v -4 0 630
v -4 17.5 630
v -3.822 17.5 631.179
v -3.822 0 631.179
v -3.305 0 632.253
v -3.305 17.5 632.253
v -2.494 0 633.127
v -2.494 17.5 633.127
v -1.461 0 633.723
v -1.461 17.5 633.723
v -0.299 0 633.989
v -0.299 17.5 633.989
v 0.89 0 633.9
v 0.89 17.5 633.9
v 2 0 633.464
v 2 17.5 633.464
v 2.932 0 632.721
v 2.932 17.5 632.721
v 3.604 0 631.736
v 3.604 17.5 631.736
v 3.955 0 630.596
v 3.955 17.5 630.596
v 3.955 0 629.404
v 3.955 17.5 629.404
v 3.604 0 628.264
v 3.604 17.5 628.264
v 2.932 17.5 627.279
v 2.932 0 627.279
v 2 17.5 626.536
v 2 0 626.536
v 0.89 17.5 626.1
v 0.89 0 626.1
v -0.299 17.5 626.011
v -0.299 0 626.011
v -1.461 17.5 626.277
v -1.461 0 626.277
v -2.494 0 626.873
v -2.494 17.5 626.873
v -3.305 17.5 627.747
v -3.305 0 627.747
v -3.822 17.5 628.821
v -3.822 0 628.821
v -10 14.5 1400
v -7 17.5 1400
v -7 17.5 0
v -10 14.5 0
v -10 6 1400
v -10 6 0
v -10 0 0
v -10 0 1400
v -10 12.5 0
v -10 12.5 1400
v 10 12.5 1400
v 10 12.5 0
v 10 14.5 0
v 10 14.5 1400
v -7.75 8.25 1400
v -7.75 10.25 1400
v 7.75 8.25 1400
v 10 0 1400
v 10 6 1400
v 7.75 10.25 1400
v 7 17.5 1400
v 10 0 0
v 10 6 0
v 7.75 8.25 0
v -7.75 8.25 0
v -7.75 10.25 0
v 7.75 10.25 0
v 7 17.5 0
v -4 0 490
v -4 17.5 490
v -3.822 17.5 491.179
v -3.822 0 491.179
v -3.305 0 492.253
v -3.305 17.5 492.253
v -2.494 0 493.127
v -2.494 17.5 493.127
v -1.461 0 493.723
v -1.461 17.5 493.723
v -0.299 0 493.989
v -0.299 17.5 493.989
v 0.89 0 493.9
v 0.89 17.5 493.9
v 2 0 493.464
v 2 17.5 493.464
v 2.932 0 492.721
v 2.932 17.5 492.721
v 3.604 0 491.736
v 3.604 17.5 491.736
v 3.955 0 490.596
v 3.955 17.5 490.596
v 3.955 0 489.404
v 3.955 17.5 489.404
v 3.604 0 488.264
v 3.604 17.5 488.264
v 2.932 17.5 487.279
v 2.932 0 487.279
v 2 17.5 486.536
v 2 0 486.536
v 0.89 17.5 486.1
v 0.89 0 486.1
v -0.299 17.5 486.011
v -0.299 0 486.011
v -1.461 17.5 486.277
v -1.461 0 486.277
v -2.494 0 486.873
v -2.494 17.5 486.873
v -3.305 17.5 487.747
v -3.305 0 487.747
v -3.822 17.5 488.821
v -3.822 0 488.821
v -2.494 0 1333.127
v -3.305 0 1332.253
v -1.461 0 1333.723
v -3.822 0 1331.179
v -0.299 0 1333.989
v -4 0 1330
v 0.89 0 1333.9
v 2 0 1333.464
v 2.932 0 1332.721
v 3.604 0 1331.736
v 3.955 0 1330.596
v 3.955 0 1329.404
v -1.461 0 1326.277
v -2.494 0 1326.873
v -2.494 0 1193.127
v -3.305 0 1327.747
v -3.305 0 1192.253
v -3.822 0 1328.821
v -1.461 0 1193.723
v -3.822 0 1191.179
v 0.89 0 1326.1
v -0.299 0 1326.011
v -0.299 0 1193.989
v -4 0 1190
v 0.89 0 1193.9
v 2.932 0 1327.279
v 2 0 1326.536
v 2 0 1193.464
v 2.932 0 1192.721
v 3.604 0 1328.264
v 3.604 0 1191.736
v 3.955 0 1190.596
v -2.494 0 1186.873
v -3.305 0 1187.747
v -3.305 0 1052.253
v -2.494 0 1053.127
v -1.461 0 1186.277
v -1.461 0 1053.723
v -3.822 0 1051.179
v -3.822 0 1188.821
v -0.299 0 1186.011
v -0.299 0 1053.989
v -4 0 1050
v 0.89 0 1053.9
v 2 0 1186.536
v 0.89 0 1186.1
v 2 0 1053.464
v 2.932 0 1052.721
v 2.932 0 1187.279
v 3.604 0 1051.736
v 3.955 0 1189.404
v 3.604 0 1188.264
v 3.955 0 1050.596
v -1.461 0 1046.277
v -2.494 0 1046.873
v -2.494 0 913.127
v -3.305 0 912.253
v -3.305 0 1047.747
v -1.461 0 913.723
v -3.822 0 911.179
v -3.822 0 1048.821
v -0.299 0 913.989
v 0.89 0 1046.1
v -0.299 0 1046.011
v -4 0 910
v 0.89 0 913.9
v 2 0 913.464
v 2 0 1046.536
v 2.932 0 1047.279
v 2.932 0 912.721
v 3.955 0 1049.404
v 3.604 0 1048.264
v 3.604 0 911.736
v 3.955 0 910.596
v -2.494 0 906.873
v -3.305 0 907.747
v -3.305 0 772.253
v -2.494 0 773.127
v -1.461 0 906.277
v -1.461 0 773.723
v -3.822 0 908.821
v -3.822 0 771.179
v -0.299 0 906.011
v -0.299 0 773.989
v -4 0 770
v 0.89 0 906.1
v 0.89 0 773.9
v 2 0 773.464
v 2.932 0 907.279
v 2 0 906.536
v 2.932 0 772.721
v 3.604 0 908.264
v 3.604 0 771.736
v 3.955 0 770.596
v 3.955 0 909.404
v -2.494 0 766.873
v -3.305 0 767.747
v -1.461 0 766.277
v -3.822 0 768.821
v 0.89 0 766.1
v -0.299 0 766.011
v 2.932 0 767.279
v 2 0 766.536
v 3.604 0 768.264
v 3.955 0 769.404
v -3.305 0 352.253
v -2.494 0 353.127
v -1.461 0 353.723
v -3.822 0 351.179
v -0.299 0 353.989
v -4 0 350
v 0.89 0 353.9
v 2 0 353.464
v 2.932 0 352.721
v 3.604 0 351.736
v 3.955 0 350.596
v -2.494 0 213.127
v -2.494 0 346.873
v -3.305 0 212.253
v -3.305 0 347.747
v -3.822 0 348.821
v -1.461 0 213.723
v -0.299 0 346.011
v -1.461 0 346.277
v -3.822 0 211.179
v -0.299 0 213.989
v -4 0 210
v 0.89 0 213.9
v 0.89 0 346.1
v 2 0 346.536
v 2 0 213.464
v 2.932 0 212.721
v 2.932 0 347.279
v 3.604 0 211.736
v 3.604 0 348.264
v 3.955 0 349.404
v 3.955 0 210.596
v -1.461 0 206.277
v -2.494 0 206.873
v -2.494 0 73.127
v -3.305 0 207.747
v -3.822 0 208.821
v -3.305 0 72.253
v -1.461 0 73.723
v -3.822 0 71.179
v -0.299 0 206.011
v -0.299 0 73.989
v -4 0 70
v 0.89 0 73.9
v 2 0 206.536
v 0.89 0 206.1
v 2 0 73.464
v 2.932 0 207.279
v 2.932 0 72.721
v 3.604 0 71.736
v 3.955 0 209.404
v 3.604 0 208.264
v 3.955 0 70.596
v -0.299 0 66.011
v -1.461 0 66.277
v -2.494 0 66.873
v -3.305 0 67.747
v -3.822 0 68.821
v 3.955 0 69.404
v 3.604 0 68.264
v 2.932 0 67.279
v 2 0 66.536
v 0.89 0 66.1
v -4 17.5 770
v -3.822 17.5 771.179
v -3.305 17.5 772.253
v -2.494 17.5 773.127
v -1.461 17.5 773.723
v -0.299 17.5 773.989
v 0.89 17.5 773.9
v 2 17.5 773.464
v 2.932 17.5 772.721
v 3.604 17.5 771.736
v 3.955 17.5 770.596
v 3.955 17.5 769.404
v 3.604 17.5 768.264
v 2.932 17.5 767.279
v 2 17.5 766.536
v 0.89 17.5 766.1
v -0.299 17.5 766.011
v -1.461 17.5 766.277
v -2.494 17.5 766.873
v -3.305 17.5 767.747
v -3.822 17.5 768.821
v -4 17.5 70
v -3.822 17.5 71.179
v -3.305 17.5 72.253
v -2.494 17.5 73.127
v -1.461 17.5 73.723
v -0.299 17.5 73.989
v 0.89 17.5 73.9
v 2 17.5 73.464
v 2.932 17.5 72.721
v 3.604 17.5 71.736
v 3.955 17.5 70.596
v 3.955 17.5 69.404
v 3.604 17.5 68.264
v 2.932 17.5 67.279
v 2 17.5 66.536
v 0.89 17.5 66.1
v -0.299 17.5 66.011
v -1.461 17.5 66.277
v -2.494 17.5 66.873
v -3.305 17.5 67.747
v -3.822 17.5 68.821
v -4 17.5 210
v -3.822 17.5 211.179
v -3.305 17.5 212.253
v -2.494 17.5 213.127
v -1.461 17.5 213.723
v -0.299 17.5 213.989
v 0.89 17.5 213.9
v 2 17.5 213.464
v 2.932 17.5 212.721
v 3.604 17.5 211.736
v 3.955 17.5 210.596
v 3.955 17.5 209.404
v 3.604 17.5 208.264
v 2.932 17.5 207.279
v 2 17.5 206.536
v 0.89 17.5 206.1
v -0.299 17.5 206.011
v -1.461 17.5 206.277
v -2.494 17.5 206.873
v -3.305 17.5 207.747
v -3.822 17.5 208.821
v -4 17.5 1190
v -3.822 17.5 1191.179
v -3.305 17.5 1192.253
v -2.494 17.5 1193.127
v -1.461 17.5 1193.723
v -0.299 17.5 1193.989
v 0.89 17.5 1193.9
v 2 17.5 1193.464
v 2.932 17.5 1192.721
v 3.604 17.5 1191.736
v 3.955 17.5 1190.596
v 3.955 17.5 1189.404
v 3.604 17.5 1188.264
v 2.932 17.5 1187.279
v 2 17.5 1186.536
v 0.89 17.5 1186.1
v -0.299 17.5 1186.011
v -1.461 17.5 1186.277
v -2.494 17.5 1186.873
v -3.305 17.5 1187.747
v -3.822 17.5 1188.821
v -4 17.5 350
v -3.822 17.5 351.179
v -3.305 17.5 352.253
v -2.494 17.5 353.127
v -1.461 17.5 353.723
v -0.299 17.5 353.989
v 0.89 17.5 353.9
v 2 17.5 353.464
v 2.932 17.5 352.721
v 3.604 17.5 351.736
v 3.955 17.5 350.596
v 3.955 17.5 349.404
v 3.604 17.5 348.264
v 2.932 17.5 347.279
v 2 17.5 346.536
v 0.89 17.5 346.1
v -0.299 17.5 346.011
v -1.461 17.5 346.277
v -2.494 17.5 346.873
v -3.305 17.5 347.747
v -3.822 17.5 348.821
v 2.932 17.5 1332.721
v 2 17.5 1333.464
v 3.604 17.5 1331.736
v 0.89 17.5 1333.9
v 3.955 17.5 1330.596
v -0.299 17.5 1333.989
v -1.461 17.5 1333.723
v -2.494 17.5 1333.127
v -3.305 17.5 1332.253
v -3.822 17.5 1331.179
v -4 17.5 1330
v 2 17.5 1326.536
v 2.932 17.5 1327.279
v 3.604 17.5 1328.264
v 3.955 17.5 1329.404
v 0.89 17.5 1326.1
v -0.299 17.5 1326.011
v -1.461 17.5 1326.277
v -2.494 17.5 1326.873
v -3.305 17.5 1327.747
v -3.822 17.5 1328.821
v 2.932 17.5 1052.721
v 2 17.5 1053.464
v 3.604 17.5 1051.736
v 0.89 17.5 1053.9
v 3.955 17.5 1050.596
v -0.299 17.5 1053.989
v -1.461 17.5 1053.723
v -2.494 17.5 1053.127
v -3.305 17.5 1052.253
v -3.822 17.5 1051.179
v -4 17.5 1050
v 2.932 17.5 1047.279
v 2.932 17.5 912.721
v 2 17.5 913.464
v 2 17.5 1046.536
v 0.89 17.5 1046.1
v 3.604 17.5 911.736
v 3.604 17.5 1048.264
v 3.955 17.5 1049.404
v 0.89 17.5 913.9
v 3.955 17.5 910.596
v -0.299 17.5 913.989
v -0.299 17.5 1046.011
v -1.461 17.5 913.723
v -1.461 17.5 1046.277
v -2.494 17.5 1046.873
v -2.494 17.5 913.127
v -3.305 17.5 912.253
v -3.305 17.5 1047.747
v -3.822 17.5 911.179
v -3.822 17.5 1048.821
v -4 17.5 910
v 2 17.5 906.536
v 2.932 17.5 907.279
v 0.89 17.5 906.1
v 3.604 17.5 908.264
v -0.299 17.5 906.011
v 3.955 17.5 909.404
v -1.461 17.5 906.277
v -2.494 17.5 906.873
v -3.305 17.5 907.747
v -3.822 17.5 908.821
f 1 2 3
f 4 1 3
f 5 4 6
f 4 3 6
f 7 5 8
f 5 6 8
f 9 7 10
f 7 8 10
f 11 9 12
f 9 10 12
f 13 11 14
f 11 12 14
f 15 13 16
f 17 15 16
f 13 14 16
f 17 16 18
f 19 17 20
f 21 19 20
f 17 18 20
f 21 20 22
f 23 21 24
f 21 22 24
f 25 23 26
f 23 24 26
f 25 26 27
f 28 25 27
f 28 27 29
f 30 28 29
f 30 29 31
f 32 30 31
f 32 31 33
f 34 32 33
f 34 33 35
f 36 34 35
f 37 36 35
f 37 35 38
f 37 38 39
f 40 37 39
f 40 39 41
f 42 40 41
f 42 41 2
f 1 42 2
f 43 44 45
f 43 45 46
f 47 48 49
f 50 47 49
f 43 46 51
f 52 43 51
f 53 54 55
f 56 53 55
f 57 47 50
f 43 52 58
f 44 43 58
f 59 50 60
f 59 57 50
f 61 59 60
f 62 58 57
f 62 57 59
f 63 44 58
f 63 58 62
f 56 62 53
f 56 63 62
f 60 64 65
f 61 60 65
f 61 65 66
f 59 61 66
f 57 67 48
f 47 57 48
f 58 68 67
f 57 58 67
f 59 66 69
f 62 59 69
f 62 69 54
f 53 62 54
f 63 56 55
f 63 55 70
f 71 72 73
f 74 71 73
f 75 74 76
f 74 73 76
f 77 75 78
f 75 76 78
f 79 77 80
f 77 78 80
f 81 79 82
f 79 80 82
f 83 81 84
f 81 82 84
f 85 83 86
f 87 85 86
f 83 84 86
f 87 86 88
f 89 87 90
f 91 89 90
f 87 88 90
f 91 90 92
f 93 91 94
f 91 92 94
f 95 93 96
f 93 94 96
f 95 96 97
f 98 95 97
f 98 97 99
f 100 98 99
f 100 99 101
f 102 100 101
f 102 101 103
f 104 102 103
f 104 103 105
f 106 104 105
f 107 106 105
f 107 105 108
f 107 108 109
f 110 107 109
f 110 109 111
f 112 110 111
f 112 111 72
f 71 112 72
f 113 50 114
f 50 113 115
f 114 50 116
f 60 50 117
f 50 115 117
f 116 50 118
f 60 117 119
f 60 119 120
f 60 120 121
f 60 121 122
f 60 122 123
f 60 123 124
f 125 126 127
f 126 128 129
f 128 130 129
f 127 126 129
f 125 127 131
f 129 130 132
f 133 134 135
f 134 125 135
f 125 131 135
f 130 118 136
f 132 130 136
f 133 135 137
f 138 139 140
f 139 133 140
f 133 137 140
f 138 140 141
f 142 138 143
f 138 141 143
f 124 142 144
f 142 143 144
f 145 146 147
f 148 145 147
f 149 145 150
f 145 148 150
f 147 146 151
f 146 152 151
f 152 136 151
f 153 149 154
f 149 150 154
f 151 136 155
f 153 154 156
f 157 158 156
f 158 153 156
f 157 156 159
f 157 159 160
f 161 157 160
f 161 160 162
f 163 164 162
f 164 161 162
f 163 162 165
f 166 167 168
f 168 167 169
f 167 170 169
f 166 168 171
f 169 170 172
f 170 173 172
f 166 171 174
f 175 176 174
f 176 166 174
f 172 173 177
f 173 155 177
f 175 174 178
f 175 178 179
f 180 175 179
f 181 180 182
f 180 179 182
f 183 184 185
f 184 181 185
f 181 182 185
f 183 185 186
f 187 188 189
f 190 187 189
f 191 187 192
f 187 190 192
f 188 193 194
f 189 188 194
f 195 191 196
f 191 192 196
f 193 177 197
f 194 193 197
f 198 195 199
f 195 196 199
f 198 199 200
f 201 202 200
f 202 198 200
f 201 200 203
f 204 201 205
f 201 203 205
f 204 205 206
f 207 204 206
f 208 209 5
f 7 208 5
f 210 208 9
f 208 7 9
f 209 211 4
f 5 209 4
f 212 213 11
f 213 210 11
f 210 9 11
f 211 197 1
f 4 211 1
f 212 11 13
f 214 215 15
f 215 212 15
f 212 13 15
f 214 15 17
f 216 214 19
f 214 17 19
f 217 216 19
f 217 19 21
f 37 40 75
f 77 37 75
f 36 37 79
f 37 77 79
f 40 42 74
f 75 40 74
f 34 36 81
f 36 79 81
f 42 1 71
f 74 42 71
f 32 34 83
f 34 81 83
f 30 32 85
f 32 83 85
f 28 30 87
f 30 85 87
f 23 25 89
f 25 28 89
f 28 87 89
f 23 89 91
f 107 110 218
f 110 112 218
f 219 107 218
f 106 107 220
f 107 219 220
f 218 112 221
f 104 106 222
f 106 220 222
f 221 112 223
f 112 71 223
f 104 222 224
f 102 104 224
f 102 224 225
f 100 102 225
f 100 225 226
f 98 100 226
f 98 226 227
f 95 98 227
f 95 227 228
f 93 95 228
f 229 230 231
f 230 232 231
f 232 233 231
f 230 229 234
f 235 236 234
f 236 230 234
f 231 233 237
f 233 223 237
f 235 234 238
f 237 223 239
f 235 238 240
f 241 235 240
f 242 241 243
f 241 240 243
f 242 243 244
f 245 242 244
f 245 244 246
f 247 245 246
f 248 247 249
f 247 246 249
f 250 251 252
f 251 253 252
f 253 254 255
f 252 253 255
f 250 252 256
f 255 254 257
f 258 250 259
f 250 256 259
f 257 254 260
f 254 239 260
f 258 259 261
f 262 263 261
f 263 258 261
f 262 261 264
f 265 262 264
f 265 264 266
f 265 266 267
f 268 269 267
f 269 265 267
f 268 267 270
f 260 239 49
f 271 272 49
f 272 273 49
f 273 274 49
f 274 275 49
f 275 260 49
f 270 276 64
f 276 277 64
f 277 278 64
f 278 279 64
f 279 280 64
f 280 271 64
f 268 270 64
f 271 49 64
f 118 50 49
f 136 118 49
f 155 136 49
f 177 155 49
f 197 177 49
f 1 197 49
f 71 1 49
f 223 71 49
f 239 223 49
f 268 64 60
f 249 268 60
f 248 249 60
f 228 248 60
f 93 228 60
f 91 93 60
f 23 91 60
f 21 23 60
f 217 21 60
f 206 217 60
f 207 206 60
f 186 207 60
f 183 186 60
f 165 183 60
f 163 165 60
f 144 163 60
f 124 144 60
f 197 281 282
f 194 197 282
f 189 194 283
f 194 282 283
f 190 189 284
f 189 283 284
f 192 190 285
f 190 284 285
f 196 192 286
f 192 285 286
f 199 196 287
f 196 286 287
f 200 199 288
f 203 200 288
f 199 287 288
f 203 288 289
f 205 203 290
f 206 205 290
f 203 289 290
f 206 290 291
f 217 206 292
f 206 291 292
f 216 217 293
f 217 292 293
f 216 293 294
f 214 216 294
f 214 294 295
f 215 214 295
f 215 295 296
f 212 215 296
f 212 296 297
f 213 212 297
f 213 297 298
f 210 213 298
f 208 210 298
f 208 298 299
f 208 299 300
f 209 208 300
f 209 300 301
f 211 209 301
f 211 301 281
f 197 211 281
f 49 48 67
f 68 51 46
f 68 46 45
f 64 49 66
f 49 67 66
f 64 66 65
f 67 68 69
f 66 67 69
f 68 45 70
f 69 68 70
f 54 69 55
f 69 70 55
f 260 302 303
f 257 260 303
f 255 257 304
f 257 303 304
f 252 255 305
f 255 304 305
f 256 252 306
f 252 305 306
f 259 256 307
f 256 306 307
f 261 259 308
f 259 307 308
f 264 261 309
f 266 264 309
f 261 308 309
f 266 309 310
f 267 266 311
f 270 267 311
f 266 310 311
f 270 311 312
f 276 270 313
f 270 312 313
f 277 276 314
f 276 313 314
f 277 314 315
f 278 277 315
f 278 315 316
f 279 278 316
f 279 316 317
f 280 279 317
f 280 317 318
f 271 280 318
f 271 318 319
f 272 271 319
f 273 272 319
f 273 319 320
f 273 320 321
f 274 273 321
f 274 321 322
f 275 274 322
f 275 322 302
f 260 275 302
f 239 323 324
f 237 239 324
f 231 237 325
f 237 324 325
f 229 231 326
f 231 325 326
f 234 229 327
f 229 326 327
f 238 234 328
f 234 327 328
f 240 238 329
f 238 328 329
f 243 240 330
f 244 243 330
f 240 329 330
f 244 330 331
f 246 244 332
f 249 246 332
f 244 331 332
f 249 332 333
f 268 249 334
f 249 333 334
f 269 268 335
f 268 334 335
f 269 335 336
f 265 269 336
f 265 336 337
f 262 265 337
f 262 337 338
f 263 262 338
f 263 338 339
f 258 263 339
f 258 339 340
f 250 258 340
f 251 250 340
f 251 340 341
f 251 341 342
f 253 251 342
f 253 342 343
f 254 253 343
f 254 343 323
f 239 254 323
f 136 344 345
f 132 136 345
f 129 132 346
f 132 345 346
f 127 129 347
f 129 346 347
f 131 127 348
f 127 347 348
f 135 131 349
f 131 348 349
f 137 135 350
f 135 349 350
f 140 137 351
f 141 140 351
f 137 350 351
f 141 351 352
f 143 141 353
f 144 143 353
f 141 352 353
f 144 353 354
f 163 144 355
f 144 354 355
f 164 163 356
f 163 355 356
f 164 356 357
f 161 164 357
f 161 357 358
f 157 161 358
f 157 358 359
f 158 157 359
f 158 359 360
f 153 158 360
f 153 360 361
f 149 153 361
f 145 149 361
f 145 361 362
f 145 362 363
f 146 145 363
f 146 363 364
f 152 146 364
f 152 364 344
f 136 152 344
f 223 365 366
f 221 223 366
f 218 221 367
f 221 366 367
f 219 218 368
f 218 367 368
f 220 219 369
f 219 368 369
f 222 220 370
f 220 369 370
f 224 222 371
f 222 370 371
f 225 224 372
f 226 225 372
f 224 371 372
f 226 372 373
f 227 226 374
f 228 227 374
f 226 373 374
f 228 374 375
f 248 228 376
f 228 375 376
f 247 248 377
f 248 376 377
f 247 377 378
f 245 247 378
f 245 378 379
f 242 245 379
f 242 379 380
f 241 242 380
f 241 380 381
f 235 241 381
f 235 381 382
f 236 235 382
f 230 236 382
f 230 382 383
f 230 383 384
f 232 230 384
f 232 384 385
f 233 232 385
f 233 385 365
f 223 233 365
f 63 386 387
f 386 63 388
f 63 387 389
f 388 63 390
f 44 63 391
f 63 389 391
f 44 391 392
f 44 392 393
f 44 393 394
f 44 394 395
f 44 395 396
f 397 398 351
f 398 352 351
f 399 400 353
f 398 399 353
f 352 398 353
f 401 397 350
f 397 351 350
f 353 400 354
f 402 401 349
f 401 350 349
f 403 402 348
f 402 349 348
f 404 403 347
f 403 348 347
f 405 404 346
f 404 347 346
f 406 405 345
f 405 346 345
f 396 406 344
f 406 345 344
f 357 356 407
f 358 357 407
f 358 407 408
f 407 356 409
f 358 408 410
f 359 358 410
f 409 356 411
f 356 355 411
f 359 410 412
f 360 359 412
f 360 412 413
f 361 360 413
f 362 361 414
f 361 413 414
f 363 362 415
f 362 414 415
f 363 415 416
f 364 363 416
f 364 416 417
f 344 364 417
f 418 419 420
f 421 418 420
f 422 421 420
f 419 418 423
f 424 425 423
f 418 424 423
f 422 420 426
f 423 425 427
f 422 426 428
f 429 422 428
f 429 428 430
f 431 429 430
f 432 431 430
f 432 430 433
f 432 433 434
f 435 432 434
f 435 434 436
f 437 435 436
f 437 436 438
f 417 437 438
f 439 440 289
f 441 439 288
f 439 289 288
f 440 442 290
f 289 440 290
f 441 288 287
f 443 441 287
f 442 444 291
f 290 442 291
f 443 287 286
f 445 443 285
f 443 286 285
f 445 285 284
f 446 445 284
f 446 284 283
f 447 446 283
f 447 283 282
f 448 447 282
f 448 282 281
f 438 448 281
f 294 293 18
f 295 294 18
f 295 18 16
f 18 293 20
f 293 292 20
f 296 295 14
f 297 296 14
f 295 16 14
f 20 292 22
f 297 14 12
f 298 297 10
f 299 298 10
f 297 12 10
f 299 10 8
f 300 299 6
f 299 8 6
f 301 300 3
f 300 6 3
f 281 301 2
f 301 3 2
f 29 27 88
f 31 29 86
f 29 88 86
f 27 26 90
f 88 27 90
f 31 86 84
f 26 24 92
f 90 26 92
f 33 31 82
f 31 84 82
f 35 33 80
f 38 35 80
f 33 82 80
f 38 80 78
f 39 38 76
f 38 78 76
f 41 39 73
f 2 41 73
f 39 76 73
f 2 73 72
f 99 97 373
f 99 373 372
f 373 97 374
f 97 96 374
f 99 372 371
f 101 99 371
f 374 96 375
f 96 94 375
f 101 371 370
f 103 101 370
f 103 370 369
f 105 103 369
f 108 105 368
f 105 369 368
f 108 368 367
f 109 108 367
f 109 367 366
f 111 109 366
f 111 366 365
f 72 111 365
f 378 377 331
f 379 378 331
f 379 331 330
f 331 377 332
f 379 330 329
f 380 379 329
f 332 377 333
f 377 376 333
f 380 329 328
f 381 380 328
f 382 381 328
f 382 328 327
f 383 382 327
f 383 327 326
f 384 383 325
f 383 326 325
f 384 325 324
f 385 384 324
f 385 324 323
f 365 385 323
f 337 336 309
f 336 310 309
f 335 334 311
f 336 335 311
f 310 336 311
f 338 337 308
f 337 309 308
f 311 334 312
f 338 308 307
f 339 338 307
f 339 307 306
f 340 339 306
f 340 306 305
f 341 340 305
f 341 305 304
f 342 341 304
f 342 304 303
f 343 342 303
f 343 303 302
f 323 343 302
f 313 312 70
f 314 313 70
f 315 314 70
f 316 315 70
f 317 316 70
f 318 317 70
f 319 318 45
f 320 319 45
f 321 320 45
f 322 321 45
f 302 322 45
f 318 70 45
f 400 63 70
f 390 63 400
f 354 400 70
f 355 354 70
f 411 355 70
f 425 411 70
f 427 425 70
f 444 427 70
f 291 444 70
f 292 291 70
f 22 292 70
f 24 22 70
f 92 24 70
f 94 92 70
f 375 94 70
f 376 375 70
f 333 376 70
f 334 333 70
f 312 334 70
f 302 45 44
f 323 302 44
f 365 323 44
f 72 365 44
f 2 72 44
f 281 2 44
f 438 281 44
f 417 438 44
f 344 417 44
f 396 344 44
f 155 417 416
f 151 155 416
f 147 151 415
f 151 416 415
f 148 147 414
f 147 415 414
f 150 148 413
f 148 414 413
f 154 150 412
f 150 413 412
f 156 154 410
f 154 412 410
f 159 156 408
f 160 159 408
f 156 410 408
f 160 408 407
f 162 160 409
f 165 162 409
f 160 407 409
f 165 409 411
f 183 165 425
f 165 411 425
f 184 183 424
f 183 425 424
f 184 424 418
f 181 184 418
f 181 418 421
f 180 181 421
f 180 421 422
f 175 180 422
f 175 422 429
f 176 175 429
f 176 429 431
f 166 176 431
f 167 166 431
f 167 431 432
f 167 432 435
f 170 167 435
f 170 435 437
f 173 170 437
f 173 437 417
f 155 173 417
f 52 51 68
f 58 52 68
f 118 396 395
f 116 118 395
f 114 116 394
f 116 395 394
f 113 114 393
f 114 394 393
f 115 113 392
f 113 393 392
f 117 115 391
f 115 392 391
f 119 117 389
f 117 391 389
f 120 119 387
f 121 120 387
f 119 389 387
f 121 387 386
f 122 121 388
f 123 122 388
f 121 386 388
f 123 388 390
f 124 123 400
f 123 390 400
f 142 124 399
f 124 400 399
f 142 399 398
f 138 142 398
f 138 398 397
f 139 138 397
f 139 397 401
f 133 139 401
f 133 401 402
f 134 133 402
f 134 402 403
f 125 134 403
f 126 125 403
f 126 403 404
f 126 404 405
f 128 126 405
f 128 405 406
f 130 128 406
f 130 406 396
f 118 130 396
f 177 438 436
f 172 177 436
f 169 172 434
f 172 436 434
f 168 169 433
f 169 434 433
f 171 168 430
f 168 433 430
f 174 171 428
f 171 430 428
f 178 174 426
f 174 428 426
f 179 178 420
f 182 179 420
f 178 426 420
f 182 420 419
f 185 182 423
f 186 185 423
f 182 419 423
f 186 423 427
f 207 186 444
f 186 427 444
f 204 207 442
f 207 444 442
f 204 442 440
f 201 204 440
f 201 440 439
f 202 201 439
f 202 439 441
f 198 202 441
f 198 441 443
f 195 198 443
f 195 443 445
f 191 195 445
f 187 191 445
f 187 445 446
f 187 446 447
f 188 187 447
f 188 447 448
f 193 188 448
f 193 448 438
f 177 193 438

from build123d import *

# Parameters (mm, degrees)
BOSS_EXTRUDE1_DEPTH = 1400
SKETCH2_R           = 4
CUT_EXTRUDE1_DEPTH  = 26


with BuildPart() as part:
    # Sketch1 → Boss-Extrude1 (new body)
    with BuildSketch(Plane.XY):
        Polygon((-10, 0), (0, 0), (0, 17.5), (-7, 17.5), (-10, 14.5), (-10, 12.5), (-7.75, 10.25), (-7.75, 8.25), (-10, 6), align=None)
        Polygon((0, 17.5), (0, 0), (10, 0), (10, 6), (7.75, 8.25), (7.75, 10.25), (10, 12.5), (10, 14.5), (7, 17.5), align=None)
    extrude(amount=BOSS_EXTRUDE1_DEPTH)

    # Sketch2 → Cut-Extrude1 (cut)
    with BuildSketch(Plane(origin=(0, 17.5, 0), x_dir=(1, 0, 0), z_dir=(0, 1, 0))):
        with Locations(Location((0, -70, 0), (0, 0, 180))):
            Circle(SKETCH2_R)
        with Locations(Location((0, -210, 0), (0, 0, 180))):
            Circle(SKETCH2_R)
        with Locations(Location((0, -350, 0), (0, 0, 180))):
            Circle(SKETCH2_R)
        with Locations(Location((0, -490, 0), (0, 0, 180))):
            Circle(SKETCH2_R)
        with Locations(Location((0, -630, 0), (0, 0, 180))):
            Circle(SKETCH2_R)
        with Locations(Location((0, -770, 0), (0, 0, 180))):
            Circle(SKETCH2_R)
        with Locations(Location((0, -910, 0), (0, 0, 180))):
            Circle(SKETCH2_R)
        with Locations(Location((0, -1050, 0), (0, 0, 180))):
            Circle(SKETCH2_R)
        with Locations(Location((0, -1190, 0), (0, 0, 180))):
            Circle(SKETCH2_R)
        with Locations(Location((0, -1330, 0), (0, 0, 180))):
            Circle(SKETCH2_R)
    extrude(amount=-CUT_EXTRUDE1_DEPTH, mode=Mode.SUBTRACT)


solid = part.part
